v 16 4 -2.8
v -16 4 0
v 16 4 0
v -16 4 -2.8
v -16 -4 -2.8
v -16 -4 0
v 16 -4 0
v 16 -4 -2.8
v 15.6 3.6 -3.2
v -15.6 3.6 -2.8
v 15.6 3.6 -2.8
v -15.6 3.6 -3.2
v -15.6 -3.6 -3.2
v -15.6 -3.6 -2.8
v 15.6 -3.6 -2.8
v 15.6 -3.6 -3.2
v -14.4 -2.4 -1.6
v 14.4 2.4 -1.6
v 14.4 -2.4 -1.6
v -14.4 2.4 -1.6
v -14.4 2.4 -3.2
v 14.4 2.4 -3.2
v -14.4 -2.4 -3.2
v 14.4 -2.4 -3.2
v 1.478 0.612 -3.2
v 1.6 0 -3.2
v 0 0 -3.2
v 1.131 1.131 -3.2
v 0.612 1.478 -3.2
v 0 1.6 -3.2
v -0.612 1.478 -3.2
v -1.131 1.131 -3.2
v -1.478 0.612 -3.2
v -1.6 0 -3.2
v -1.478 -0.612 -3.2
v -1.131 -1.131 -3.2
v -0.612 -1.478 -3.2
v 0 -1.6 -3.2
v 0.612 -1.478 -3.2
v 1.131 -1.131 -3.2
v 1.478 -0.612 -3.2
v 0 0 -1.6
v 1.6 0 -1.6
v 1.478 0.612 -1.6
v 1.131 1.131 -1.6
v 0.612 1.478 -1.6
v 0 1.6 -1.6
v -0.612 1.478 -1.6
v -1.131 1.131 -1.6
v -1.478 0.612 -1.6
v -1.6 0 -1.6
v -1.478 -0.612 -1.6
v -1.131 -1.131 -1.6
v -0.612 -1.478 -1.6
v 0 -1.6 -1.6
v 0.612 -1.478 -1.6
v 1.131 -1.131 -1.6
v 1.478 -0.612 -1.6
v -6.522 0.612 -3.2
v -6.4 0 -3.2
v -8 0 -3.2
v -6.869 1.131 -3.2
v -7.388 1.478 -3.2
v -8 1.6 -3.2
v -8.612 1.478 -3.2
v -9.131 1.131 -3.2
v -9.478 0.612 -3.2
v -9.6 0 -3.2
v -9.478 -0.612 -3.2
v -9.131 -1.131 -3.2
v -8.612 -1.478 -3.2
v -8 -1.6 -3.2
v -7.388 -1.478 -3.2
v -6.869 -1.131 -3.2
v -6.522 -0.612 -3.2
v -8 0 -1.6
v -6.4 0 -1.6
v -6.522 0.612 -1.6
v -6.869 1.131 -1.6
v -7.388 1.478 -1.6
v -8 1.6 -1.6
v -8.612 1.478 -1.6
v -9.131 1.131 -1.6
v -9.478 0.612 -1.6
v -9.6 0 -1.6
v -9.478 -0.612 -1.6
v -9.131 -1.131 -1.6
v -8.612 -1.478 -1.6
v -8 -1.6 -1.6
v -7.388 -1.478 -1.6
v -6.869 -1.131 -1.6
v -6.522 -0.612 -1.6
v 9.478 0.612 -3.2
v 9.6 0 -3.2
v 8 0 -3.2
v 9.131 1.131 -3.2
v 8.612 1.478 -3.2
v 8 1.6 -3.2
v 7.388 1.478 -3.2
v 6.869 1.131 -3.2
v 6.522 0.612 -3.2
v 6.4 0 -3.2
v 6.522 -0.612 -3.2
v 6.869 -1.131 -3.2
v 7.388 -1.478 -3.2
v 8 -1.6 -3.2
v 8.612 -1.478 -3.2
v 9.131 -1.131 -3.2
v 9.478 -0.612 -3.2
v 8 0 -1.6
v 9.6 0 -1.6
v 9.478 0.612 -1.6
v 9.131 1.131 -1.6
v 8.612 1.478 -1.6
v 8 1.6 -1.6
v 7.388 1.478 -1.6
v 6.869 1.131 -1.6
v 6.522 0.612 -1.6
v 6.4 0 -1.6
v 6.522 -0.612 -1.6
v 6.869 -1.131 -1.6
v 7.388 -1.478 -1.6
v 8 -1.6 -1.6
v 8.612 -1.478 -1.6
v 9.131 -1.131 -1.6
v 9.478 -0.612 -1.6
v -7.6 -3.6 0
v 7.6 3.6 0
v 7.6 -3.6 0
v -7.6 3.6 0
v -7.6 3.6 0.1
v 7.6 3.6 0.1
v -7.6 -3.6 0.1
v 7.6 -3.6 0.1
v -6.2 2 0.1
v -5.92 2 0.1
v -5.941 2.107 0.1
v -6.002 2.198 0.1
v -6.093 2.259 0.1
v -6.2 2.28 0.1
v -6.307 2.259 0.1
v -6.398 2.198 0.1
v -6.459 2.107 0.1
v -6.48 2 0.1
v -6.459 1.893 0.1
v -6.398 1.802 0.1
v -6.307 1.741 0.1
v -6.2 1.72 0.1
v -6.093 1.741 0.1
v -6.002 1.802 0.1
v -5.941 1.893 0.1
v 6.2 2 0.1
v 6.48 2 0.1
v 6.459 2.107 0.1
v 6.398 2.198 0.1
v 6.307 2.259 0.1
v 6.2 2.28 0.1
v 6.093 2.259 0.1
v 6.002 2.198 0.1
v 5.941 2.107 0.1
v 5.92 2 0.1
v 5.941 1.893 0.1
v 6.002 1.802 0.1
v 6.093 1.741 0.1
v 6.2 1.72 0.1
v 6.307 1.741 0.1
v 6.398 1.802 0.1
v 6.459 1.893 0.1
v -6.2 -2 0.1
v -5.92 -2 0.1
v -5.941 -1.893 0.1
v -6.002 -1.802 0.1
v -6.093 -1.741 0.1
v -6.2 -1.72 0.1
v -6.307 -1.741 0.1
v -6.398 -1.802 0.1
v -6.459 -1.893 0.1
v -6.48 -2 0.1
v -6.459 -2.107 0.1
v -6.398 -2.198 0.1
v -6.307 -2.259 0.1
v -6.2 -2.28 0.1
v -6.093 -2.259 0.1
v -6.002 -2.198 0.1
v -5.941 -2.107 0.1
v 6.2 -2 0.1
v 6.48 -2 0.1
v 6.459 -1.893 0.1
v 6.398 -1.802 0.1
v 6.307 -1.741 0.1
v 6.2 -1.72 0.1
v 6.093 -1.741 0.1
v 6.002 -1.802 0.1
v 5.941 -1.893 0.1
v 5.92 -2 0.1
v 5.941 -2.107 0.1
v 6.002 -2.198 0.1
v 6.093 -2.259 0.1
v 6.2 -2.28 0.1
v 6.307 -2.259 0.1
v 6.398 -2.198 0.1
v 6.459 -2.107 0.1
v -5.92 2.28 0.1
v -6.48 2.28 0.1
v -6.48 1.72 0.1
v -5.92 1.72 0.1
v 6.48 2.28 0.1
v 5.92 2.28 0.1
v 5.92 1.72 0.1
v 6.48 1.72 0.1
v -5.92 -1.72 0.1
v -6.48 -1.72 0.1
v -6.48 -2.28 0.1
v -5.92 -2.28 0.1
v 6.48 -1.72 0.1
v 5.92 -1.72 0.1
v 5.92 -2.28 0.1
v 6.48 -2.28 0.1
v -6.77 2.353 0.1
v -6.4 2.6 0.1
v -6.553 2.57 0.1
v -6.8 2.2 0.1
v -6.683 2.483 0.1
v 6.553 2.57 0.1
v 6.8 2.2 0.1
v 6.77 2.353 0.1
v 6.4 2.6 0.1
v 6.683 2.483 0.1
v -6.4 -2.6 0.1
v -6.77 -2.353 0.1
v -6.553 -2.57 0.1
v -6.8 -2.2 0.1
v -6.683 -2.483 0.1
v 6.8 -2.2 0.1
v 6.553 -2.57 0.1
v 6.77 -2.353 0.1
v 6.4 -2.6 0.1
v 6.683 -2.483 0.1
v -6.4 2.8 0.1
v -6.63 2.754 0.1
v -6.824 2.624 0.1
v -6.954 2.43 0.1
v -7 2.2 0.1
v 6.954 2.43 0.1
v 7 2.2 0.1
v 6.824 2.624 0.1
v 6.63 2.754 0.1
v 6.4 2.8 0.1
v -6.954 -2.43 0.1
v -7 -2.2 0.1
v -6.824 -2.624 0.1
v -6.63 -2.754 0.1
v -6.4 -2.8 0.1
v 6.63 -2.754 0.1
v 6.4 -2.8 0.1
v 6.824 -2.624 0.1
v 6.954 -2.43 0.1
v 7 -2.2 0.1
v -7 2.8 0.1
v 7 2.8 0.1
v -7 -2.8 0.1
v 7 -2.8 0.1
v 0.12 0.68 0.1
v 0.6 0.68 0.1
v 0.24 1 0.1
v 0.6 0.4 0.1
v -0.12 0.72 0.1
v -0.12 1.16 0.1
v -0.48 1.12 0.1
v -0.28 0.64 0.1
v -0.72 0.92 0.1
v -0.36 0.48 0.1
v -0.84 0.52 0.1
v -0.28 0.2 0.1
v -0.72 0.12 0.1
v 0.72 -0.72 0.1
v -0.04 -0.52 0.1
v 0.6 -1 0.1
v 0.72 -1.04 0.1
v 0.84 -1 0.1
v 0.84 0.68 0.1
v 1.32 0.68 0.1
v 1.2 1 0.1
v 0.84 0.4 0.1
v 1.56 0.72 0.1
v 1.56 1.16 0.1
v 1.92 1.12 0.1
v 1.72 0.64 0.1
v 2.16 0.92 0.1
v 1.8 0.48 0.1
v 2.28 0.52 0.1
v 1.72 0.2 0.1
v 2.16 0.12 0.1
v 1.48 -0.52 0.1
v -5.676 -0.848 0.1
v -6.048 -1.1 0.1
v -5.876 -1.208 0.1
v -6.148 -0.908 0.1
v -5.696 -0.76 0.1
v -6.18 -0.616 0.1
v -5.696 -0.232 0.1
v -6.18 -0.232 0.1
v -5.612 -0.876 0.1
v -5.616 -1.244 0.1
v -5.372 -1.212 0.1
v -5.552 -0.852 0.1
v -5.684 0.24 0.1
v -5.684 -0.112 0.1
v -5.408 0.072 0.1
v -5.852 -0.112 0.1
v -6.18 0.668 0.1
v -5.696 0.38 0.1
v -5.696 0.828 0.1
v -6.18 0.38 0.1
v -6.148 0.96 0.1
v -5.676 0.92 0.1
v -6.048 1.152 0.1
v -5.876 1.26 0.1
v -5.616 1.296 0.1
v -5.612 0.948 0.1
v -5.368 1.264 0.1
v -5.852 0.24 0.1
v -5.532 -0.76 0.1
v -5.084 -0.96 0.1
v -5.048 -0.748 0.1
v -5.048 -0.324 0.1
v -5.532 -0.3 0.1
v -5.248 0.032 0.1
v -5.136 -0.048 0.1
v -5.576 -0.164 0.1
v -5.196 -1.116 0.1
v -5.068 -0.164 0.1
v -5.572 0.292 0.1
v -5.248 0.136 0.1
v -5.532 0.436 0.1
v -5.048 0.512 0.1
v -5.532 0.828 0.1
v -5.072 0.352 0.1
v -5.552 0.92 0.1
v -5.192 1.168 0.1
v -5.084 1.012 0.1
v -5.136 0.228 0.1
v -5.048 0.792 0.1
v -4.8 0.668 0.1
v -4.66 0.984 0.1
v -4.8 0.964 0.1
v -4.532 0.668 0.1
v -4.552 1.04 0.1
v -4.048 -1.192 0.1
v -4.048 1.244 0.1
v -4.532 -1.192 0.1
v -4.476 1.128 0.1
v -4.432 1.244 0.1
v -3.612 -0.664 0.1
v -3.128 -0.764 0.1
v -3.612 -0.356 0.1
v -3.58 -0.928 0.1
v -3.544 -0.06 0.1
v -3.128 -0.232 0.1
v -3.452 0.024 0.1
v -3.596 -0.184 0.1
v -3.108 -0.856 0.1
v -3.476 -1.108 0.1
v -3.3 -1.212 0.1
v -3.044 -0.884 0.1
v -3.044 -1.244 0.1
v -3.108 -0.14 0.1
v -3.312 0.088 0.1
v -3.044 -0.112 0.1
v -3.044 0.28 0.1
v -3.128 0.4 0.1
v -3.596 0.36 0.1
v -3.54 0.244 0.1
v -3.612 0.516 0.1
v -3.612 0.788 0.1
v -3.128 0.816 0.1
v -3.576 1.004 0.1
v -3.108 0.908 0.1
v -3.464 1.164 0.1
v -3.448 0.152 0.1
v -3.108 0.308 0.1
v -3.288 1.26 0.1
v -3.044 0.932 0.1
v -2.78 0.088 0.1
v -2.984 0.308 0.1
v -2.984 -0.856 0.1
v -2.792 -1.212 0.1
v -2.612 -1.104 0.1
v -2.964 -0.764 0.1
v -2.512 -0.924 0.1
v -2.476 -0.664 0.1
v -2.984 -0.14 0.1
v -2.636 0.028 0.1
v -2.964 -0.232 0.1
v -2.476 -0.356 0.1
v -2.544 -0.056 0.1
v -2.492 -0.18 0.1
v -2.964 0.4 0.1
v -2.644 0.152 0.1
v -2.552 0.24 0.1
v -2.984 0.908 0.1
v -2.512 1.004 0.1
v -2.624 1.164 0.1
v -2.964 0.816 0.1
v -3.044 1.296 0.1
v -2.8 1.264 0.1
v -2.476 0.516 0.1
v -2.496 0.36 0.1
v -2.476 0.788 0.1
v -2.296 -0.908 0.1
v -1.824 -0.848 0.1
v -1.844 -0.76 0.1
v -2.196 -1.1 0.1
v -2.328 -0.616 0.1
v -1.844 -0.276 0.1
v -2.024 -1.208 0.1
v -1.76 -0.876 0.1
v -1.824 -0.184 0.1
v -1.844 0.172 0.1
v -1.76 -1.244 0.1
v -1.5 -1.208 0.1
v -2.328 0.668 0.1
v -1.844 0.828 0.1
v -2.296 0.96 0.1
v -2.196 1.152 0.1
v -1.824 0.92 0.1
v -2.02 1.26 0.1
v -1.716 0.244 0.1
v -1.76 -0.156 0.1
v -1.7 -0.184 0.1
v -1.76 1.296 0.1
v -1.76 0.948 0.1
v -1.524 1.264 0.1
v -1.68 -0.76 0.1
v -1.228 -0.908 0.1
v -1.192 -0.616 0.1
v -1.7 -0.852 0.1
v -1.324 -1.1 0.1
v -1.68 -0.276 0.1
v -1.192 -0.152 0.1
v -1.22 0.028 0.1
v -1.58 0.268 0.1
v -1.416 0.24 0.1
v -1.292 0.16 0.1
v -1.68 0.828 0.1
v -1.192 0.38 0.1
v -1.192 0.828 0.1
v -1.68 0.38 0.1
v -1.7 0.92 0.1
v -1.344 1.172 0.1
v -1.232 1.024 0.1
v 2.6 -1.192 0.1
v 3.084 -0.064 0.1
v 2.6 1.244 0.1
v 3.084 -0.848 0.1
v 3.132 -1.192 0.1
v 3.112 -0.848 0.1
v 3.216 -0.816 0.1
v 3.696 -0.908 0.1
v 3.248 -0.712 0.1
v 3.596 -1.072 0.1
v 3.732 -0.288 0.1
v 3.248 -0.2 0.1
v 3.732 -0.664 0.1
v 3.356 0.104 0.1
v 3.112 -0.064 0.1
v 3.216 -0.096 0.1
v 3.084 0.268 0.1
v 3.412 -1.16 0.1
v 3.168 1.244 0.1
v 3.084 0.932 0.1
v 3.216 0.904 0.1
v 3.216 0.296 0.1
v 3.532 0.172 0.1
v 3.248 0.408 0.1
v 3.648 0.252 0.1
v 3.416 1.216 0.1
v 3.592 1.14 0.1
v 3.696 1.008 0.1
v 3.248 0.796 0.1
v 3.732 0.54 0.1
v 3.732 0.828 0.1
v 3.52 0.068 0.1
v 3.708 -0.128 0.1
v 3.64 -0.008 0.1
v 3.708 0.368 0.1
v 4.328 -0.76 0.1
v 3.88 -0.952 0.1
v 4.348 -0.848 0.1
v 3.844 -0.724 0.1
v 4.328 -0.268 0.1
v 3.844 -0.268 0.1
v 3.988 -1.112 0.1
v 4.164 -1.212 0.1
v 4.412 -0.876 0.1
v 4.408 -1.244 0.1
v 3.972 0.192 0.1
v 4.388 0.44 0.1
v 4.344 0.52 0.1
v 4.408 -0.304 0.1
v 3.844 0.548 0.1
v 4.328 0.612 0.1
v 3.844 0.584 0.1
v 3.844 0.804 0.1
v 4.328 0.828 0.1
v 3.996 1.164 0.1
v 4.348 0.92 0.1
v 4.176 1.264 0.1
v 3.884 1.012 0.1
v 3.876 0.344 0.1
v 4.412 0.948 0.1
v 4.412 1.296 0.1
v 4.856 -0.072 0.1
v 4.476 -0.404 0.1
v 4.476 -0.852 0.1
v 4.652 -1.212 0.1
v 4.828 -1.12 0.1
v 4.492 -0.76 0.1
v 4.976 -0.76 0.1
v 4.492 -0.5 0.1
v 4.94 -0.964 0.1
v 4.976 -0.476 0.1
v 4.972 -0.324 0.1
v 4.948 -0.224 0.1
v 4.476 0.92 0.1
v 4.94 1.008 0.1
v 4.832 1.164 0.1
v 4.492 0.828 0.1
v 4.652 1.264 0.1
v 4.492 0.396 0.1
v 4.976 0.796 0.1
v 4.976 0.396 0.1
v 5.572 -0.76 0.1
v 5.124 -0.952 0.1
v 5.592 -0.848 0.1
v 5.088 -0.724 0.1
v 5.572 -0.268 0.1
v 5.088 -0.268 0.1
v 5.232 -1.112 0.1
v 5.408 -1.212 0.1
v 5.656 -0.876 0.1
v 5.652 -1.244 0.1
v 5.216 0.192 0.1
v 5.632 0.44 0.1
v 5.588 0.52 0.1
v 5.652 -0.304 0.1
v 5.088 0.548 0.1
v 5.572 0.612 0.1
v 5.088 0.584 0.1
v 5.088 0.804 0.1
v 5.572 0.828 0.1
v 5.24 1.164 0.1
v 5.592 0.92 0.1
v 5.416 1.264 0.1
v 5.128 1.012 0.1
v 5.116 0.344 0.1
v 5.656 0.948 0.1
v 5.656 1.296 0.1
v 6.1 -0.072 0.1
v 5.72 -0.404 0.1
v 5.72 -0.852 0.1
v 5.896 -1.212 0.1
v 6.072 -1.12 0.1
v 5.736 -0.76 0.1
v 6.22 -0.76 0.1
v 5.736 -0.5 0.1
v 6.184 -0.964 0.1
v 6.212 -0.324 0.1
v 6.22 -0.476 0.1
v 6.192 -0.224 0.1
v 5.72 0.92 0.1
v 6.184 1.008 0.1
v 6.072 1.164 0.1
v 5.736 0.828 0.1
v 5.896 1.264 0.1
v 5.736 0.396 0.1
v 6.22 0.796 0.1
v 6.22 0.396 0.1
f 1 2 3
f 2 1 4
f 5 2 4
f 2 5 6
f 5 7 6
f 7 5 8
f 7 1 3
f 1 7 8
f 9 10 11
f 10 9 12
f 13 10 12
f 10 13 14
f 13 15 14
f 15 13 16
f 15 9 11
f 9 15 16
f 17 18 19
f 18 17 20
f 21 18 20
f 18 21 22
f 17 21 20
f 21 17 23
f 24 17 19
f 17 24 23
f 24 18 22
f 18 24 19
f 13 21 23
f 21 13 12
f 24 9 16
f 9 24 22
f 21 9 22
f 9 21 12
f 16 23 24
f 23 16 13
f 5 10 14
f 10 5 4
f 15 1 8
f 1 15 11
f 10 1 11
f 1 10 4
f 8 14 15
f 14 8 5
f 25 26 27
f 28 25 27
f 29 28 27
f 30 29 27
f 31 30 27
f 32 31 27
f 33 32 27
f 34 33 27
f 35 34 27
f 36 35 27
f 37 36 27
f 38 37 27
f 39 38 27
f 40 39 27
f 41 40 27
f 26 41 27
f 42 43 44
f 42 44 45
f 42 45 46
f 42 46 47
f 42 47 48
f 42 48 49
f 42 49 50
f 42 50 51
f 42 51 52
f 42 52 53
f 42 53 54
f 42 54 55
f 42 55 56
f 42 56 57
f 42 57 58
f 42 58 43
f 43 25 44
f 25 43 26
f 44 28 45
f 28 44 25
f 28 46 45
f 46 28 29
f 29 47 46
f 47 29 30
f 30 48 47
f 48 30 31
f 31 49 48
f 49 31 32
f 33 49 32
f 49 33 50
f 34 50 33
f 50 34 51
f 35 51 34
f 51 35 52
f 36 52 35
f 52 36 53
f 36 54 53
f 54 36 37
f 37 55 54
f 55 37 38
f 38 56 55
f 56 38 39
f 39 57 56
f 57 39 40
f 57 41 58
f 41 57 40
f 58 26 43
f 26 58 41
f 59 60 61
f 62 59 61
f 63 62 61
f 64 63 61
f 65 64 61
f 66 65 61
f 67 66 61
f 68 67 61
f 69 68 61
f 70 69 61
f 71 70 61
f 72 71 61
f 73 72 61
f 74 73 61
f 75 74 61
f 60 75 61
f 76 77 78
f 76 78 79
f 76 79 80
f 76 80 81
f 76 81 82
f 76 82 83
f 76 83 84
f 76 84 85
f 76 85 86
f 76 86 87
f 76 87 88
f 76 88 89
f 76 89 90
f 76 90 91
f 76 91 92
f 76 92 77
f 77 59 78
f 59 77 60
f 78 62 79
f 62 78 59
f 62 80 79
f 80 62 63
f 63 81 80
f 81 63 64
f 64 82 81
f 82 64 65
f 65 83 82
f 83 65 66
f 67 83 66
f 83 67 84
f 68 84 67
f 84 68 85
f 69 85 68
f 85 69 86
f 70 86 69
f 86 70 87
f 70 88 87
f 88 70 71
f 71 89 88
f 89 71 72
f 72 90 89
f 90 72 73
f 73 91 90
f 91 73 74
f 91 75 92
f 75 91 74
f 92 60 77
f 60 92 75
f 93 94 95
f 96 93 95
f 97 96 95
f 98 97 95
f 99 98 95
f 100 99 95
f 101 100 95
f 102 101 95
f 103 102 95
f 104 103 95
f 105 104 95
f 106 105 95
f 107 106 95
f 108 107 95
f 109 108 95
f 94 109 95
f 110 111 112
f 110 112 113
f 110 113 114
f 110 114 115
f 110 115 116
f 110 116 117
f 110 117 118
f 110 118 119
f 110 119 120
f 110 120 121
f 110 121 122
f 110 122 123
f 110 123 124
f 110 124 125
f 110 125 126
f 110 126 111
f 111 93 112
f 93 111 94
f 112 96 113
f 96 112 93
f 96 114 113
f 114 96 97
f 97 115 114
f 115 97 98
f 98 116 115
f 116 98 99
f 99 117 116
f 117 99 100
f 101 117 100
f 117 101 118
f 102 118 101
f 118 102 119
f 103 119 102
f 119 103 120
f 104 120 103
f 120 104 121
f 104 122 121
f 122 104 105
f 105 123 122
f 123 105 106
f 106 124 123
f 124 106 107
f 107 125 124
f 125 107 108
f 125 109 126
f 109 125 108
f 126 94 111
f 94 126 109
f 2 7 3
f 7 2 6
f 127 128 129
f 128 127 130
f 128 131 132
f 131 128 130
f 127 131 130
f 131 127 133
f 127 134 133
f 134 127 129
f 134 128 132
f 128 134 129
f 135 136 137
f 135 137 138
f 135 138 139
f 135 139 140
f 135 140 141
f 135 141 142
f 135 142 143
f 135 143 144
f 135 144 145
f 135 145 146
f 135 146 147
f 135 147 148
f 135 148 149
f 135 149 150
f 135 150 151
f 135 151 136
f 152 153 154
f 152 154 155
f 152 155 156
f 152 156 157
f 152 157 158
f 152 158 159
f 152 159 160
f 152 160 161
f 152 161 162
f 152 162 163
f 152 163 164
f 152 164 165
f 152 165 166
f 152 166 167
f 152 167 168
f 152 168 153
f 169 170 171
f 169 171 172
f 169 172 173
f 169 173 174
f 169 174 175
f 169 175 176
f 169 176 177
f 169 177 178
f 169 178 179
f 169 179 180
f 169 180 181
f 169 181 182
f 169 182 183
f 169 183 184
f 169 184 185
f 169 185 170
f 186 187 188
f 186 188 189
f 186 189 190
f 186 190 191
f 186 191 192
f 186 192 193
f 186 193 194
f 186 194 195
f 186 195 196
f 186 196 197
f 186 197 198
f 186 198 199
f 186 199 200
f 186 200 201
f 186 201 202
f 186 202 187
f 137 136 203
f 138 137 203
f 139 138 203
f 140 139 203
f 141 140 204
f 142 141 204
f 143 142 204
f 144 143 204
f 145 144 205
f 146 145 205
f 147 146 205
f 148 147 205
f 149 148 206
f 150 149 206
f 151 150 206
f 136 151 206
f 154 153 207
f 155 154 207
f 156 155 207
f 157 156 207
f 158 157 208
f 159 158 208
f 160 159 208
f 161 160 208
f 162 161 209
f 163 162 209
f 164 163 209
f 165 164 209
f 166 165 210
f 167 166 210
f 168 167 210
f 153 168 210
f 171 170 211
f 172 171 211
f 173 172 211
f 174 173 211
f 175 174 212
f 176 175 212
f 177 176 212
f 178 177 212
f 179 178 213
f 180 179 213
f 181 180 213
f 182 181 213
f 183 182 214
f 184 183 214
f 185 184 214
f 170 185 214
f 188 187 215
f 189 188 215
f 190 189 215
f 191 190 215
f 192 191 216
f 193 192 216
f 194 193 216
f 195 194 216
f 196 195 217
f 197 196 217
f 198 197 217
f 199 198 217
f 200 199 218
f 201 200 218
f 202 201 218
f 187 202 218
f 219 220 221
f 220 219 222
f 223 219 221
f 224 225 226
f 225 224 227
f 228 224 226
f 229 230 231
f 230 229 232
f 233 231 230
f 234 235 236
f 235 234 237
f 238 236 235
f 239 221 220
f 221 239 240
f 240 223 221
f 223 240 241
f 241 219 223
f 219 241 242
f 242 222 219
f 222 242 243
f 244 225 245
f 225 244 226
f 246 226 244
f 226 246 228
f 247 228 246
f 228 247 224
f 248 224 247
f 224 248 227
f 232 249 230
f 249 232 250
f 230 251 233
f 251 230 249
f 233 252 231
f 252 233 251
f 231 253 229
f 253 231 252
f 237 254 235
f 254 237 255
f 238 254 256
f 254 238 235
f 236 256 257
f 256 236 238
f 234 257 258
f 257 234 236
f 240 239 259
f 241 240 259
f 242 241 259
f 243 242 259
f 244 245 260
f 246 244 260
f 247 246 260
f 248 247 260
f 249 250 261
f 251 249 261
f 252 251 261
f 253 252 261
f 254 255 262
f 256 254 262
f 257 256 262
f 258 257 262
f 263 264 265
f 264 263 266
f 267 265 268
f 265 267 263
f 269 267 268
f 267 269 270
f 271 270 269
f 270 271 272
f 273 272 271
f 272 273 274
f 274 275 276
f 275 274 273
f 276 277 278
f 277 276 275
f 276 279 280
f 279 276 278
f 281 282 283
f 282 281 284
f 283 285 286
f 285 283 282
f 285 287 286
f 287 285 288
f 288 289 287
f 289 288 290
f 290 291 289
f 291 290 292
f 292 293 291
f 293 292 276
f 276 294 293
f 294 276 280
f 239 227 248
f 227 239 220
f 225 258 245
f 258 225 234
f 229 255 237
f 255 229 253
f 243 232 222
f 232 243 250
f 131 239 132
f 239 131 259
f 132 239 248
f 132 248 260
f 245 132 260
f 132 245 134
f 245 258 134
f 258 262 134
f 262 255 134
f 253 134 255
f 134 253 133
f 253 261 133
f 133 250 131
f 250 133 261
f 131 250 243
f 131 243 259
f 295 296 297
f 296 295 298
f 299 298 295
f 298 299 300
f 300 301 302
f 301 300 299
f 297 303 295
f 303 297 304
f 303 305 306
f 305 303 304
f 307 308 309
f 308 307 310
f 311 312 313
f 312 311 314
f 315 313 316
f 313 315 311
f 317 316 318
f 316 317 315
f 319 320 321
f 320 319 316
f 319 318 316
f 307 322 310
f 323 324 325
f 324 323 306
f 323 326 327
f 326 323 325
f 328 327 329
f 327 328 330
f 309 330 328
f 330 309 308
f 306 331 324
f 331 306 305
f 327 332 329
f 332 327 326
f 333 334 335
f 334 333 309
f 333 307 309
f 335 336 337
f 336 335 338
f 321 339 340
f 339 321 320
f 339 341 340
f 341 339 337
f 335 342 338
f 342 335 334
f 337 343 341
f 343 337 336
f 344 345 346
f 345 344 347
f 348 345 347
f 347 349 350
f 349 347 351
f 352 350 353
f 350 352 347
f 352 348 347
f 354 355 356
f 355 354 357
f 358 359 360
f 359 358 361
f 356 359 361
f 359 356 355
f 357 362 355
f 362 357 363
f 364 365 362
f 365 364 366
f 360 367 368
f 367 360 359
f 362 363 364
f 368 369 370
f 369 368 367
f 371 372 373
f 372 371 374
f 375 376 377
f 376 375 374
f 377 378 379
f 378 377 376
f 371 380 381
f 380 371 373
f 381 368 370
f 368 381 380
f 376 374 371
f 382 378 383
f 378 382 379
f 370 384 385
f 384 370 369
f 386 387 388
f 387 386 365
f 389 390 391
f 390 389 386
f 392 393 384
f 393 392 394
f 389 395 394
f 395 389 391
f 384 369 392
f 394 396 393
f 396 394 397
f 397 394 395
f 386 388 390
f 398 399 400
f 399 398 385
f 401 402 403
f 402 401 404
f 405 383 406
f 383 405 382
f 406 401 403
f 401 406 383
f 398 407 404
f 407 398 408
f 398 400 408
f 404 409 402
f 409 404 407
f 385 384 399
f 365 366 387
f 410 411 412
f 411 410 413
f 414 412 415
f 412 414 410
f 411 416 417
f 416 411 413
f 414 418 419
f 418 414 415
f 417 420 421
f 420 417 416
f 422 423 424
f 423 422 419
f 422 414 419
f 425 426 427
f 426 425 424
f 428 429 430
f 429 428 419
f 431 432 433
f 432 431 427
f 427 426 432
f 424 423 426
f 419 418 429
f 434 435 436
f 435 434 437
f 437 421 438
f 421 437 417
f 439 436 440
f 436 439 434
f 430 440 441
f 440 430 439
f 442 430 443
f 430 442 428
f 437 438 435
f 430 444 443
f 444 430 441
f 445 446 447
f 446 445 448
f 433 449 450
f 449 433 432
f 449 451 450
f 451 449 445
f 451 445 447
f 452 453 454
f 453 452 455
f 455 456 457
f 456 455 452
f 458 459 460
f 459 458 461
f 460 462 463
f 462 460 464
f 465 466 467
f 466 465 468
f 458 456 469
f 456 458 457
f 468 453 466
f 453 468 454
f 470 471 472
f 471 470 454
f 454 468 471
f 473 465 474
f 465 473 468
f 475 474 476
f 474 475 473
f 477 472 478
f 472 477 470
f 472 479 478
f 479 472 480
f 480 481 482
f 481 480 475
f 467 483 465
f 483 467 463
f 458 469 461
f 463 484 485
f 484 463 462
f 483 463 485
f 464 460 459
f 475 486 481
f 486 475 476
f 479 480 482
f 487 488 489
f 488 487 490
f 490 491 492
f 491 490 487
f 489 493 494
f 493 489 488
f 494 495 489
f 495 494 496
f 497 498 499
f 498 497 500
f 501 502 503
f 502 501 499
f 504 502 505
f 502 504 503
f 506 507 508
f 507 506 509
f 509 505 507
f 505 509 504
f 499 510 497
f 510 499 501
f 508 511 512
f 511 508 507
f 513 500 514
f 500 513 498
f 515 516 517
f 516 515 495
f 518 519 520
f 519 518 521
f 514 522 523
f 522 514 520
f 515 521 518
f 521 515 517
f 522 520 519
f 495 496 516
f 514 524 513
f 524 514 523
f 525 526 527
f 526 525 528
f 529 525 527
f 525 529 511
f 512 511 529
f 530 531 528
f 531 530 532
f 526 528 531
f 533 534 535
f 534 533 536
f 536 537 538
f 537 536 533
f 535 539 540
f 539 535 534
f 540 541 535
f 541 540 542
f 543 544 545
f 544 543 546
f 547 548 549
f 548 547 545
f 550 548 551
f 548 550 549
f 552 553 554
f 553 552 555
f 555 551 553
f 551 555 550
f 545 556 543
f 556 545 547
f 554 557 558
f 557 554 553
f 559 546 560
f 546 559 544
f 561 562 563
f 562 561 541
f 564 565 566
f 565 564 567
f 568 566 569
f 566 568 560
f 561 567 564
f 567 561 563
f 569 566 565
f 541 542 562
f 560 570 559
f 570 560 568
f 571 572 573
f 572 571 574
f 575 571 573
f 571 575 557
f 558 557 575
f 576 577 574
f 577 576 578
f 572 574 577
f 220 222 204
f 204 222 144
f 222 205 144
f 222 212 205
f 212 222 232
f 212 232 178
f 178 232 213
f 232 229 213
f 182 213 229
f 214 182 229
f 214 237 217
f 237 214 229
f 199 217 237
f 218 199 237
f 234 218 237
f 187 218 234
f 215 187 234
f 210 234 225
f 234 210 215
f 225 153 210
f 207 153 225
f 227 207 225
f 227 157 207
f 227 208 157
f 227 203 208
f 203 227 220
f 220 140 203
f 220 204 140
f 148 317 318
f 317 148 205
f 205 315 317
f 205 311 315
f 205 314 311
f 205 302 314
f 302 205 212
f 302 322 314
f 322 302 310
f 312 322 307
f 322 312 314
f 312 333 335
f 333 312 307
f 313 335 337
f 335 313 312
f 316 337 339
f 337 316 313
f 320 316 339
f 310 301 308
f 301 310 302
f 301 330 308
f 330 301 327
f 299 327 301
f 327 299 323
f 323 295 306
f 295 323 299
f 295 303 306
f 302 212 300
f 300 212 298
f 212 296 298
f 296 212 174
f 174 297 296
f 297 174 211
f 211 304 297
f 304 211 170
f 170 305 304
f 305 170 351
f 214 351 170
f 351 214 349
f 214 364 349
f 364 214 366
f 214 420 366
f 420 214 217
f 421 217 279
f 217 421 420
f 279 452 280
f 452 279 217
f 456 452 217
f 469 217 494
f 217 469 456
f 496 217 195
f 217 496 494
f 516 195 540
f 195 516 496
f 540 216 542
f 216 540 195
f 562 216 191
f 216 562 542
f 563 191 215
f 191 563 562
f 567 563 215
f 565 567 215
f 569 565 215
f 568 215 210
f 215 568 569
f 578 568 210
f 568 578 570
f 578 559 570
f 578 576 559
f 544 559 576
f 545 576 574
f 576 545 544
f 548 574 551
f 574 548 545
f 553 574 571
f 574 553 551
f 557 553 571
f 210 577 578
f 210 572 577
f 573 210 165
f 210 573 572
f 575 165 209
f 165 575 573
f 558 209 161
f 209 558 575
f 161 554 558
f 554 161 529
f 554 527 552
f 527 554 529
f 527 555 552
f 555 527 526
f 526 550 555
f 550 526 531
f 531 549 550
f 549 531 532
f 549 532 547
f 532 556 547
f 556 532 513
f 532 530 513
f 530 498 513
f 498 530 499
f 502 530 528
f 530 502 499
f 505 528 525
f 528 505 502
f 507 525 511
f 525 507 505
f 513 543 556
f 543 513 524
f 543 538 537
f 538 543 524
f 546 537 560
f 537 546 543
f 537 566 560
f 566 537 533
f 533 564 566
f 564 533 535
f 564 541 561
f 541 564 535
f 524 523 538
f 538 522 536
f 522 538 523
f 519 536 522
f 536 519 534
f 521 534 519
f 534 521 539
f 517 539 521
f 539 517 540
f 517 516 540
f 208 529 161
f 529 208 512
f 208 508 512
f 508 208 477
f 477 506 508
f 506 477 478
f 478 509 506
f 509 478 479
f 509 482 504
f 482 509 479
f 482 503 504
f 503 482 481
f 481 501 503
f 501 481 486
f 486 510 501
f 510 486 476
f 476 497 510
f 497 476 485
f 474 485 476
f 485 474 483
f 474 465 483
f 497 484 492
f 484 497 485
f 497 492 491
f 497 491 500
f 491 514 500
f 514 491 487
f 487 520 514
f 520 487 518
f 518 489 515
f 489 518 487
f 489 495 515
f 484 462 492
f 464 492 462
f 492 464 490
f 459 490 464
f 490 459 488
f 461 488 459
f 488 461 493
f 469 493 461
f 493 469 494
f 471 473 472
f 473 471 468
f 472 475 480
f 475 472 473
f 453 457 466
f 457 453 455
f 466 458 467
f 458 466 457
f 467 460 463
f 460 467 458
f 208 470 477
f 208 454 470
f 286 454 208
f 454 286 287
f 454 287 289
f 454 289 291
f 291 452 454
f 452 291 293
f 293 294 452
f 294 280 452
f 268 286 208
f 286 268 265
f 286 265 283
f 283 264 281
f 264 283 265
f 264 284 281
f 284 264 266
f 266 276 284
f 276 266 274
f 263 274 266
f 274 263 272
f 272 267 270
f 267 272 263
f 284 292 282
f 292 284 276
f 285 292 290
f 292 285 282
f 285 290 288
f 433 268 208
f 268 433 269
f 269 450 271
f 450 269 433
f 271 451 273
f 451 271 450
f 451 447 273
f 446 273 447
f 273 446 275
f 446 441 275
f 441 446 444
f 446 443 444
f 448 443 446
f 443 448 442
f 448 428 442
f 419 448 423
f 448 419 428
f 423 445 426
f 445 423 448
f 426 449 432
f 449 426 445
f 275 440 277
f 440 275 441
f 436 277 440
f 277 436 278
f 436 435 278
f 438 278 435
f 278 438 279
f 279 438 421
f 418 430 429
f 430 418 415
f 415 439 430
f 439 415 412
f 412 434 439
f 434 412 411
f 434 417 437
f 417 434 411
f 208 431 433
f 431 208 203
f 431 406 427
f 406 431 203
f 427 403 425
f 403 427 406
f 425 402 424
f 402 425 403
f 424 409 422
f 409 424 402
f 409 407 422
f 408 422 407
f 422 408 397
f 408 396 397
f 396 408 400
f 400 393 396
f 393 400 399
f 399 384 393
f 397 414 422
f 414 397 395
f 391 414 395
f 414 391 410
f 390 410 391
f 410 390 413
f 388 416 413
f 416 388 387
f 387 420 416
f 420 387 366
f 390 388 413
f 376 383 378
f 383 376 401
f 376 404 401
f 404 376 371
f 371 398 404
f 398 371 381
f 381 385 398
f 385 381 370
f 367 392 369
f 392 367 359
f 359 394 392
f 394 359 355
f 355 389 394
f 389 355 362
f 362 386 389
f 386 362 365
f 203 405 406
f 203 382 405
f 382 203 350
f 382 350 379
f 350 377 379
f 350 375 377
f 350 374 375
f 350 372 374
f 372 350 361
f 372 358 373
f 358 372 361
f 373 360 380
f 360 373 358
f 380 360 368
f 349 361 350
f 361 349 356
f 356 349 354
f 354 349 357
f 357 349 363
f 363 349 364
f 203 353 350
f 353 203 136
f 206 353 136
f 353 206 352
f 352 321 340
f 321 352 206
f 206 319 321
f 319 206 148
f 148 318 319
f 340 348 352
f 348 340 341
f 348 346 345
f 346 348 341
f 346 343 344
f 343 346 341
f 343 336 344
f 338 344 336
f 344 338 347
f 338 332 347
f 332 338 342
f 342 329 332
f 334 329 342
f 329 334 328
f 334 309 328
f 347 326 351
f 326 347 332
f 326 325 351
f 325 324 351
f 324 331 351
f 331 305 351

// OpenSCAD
use <../lib.scad>
use <2431.scad>
use <4620857d.scad>
function ldraw_lib__2431df0() = [
// 0 Tile  1 x  4 with Dark Red Heart and "3186 BSS" License Plate Sticker
// 0 Name: 2431df0.dat
// 0 Author: Takeshi Takahashi [RainbowDolphin]
// 0 !LDRAW_ORG Shortcut UPDATE 2024-10
// 0 !LICENSE Licensed under CC BY 4.0 : see CAreadme.txt
// 
// 0 BFC CERTIFY CCW
  [0,"BFC","CERTIFY"],
  [0,"BFC","CCW"],
// 
// 0 !CATEGORY Sticker Shortcut
// 0 !KEYWORDS Bricklink 2431pb304, Friends, Horse Trailer, Set 3186
// 
// 0 !HISTORY 2024-10-27 [OrionP] Official Update 2024-09
// 0 !HISTORY 2024-11-09 [MagFors] Update description
// 0 !HISTORY 2024-12-01 [OrionP] Official Update 2024-10
// 
// 1 16 0 0 0 1 0 0 0 1 0 0 0 1 2431.dat
  [1,16,0,0,0,1,0,0,0,1,0,0,0,1, ldraw_lib__2431()],
// 1 16 0 0 0 1 0 0 0 1 0 0 0 1 4620857d.dat
  [1,16,0,0,0,1,0,0,0,1,0,0,0,1, ldraw_lib__4620857d()],
];
module ldraw_lib__2431df0(step=0, col=false, unit=2/5, alt=false, line=0.2, solid=!$preview)
    makepoly(ldraw_lib__2431df0(), step=step, col=col, unit=unit, alt=alt, line=line, solid=solid);
ldraw_lib__2431df0(line=0.2);
